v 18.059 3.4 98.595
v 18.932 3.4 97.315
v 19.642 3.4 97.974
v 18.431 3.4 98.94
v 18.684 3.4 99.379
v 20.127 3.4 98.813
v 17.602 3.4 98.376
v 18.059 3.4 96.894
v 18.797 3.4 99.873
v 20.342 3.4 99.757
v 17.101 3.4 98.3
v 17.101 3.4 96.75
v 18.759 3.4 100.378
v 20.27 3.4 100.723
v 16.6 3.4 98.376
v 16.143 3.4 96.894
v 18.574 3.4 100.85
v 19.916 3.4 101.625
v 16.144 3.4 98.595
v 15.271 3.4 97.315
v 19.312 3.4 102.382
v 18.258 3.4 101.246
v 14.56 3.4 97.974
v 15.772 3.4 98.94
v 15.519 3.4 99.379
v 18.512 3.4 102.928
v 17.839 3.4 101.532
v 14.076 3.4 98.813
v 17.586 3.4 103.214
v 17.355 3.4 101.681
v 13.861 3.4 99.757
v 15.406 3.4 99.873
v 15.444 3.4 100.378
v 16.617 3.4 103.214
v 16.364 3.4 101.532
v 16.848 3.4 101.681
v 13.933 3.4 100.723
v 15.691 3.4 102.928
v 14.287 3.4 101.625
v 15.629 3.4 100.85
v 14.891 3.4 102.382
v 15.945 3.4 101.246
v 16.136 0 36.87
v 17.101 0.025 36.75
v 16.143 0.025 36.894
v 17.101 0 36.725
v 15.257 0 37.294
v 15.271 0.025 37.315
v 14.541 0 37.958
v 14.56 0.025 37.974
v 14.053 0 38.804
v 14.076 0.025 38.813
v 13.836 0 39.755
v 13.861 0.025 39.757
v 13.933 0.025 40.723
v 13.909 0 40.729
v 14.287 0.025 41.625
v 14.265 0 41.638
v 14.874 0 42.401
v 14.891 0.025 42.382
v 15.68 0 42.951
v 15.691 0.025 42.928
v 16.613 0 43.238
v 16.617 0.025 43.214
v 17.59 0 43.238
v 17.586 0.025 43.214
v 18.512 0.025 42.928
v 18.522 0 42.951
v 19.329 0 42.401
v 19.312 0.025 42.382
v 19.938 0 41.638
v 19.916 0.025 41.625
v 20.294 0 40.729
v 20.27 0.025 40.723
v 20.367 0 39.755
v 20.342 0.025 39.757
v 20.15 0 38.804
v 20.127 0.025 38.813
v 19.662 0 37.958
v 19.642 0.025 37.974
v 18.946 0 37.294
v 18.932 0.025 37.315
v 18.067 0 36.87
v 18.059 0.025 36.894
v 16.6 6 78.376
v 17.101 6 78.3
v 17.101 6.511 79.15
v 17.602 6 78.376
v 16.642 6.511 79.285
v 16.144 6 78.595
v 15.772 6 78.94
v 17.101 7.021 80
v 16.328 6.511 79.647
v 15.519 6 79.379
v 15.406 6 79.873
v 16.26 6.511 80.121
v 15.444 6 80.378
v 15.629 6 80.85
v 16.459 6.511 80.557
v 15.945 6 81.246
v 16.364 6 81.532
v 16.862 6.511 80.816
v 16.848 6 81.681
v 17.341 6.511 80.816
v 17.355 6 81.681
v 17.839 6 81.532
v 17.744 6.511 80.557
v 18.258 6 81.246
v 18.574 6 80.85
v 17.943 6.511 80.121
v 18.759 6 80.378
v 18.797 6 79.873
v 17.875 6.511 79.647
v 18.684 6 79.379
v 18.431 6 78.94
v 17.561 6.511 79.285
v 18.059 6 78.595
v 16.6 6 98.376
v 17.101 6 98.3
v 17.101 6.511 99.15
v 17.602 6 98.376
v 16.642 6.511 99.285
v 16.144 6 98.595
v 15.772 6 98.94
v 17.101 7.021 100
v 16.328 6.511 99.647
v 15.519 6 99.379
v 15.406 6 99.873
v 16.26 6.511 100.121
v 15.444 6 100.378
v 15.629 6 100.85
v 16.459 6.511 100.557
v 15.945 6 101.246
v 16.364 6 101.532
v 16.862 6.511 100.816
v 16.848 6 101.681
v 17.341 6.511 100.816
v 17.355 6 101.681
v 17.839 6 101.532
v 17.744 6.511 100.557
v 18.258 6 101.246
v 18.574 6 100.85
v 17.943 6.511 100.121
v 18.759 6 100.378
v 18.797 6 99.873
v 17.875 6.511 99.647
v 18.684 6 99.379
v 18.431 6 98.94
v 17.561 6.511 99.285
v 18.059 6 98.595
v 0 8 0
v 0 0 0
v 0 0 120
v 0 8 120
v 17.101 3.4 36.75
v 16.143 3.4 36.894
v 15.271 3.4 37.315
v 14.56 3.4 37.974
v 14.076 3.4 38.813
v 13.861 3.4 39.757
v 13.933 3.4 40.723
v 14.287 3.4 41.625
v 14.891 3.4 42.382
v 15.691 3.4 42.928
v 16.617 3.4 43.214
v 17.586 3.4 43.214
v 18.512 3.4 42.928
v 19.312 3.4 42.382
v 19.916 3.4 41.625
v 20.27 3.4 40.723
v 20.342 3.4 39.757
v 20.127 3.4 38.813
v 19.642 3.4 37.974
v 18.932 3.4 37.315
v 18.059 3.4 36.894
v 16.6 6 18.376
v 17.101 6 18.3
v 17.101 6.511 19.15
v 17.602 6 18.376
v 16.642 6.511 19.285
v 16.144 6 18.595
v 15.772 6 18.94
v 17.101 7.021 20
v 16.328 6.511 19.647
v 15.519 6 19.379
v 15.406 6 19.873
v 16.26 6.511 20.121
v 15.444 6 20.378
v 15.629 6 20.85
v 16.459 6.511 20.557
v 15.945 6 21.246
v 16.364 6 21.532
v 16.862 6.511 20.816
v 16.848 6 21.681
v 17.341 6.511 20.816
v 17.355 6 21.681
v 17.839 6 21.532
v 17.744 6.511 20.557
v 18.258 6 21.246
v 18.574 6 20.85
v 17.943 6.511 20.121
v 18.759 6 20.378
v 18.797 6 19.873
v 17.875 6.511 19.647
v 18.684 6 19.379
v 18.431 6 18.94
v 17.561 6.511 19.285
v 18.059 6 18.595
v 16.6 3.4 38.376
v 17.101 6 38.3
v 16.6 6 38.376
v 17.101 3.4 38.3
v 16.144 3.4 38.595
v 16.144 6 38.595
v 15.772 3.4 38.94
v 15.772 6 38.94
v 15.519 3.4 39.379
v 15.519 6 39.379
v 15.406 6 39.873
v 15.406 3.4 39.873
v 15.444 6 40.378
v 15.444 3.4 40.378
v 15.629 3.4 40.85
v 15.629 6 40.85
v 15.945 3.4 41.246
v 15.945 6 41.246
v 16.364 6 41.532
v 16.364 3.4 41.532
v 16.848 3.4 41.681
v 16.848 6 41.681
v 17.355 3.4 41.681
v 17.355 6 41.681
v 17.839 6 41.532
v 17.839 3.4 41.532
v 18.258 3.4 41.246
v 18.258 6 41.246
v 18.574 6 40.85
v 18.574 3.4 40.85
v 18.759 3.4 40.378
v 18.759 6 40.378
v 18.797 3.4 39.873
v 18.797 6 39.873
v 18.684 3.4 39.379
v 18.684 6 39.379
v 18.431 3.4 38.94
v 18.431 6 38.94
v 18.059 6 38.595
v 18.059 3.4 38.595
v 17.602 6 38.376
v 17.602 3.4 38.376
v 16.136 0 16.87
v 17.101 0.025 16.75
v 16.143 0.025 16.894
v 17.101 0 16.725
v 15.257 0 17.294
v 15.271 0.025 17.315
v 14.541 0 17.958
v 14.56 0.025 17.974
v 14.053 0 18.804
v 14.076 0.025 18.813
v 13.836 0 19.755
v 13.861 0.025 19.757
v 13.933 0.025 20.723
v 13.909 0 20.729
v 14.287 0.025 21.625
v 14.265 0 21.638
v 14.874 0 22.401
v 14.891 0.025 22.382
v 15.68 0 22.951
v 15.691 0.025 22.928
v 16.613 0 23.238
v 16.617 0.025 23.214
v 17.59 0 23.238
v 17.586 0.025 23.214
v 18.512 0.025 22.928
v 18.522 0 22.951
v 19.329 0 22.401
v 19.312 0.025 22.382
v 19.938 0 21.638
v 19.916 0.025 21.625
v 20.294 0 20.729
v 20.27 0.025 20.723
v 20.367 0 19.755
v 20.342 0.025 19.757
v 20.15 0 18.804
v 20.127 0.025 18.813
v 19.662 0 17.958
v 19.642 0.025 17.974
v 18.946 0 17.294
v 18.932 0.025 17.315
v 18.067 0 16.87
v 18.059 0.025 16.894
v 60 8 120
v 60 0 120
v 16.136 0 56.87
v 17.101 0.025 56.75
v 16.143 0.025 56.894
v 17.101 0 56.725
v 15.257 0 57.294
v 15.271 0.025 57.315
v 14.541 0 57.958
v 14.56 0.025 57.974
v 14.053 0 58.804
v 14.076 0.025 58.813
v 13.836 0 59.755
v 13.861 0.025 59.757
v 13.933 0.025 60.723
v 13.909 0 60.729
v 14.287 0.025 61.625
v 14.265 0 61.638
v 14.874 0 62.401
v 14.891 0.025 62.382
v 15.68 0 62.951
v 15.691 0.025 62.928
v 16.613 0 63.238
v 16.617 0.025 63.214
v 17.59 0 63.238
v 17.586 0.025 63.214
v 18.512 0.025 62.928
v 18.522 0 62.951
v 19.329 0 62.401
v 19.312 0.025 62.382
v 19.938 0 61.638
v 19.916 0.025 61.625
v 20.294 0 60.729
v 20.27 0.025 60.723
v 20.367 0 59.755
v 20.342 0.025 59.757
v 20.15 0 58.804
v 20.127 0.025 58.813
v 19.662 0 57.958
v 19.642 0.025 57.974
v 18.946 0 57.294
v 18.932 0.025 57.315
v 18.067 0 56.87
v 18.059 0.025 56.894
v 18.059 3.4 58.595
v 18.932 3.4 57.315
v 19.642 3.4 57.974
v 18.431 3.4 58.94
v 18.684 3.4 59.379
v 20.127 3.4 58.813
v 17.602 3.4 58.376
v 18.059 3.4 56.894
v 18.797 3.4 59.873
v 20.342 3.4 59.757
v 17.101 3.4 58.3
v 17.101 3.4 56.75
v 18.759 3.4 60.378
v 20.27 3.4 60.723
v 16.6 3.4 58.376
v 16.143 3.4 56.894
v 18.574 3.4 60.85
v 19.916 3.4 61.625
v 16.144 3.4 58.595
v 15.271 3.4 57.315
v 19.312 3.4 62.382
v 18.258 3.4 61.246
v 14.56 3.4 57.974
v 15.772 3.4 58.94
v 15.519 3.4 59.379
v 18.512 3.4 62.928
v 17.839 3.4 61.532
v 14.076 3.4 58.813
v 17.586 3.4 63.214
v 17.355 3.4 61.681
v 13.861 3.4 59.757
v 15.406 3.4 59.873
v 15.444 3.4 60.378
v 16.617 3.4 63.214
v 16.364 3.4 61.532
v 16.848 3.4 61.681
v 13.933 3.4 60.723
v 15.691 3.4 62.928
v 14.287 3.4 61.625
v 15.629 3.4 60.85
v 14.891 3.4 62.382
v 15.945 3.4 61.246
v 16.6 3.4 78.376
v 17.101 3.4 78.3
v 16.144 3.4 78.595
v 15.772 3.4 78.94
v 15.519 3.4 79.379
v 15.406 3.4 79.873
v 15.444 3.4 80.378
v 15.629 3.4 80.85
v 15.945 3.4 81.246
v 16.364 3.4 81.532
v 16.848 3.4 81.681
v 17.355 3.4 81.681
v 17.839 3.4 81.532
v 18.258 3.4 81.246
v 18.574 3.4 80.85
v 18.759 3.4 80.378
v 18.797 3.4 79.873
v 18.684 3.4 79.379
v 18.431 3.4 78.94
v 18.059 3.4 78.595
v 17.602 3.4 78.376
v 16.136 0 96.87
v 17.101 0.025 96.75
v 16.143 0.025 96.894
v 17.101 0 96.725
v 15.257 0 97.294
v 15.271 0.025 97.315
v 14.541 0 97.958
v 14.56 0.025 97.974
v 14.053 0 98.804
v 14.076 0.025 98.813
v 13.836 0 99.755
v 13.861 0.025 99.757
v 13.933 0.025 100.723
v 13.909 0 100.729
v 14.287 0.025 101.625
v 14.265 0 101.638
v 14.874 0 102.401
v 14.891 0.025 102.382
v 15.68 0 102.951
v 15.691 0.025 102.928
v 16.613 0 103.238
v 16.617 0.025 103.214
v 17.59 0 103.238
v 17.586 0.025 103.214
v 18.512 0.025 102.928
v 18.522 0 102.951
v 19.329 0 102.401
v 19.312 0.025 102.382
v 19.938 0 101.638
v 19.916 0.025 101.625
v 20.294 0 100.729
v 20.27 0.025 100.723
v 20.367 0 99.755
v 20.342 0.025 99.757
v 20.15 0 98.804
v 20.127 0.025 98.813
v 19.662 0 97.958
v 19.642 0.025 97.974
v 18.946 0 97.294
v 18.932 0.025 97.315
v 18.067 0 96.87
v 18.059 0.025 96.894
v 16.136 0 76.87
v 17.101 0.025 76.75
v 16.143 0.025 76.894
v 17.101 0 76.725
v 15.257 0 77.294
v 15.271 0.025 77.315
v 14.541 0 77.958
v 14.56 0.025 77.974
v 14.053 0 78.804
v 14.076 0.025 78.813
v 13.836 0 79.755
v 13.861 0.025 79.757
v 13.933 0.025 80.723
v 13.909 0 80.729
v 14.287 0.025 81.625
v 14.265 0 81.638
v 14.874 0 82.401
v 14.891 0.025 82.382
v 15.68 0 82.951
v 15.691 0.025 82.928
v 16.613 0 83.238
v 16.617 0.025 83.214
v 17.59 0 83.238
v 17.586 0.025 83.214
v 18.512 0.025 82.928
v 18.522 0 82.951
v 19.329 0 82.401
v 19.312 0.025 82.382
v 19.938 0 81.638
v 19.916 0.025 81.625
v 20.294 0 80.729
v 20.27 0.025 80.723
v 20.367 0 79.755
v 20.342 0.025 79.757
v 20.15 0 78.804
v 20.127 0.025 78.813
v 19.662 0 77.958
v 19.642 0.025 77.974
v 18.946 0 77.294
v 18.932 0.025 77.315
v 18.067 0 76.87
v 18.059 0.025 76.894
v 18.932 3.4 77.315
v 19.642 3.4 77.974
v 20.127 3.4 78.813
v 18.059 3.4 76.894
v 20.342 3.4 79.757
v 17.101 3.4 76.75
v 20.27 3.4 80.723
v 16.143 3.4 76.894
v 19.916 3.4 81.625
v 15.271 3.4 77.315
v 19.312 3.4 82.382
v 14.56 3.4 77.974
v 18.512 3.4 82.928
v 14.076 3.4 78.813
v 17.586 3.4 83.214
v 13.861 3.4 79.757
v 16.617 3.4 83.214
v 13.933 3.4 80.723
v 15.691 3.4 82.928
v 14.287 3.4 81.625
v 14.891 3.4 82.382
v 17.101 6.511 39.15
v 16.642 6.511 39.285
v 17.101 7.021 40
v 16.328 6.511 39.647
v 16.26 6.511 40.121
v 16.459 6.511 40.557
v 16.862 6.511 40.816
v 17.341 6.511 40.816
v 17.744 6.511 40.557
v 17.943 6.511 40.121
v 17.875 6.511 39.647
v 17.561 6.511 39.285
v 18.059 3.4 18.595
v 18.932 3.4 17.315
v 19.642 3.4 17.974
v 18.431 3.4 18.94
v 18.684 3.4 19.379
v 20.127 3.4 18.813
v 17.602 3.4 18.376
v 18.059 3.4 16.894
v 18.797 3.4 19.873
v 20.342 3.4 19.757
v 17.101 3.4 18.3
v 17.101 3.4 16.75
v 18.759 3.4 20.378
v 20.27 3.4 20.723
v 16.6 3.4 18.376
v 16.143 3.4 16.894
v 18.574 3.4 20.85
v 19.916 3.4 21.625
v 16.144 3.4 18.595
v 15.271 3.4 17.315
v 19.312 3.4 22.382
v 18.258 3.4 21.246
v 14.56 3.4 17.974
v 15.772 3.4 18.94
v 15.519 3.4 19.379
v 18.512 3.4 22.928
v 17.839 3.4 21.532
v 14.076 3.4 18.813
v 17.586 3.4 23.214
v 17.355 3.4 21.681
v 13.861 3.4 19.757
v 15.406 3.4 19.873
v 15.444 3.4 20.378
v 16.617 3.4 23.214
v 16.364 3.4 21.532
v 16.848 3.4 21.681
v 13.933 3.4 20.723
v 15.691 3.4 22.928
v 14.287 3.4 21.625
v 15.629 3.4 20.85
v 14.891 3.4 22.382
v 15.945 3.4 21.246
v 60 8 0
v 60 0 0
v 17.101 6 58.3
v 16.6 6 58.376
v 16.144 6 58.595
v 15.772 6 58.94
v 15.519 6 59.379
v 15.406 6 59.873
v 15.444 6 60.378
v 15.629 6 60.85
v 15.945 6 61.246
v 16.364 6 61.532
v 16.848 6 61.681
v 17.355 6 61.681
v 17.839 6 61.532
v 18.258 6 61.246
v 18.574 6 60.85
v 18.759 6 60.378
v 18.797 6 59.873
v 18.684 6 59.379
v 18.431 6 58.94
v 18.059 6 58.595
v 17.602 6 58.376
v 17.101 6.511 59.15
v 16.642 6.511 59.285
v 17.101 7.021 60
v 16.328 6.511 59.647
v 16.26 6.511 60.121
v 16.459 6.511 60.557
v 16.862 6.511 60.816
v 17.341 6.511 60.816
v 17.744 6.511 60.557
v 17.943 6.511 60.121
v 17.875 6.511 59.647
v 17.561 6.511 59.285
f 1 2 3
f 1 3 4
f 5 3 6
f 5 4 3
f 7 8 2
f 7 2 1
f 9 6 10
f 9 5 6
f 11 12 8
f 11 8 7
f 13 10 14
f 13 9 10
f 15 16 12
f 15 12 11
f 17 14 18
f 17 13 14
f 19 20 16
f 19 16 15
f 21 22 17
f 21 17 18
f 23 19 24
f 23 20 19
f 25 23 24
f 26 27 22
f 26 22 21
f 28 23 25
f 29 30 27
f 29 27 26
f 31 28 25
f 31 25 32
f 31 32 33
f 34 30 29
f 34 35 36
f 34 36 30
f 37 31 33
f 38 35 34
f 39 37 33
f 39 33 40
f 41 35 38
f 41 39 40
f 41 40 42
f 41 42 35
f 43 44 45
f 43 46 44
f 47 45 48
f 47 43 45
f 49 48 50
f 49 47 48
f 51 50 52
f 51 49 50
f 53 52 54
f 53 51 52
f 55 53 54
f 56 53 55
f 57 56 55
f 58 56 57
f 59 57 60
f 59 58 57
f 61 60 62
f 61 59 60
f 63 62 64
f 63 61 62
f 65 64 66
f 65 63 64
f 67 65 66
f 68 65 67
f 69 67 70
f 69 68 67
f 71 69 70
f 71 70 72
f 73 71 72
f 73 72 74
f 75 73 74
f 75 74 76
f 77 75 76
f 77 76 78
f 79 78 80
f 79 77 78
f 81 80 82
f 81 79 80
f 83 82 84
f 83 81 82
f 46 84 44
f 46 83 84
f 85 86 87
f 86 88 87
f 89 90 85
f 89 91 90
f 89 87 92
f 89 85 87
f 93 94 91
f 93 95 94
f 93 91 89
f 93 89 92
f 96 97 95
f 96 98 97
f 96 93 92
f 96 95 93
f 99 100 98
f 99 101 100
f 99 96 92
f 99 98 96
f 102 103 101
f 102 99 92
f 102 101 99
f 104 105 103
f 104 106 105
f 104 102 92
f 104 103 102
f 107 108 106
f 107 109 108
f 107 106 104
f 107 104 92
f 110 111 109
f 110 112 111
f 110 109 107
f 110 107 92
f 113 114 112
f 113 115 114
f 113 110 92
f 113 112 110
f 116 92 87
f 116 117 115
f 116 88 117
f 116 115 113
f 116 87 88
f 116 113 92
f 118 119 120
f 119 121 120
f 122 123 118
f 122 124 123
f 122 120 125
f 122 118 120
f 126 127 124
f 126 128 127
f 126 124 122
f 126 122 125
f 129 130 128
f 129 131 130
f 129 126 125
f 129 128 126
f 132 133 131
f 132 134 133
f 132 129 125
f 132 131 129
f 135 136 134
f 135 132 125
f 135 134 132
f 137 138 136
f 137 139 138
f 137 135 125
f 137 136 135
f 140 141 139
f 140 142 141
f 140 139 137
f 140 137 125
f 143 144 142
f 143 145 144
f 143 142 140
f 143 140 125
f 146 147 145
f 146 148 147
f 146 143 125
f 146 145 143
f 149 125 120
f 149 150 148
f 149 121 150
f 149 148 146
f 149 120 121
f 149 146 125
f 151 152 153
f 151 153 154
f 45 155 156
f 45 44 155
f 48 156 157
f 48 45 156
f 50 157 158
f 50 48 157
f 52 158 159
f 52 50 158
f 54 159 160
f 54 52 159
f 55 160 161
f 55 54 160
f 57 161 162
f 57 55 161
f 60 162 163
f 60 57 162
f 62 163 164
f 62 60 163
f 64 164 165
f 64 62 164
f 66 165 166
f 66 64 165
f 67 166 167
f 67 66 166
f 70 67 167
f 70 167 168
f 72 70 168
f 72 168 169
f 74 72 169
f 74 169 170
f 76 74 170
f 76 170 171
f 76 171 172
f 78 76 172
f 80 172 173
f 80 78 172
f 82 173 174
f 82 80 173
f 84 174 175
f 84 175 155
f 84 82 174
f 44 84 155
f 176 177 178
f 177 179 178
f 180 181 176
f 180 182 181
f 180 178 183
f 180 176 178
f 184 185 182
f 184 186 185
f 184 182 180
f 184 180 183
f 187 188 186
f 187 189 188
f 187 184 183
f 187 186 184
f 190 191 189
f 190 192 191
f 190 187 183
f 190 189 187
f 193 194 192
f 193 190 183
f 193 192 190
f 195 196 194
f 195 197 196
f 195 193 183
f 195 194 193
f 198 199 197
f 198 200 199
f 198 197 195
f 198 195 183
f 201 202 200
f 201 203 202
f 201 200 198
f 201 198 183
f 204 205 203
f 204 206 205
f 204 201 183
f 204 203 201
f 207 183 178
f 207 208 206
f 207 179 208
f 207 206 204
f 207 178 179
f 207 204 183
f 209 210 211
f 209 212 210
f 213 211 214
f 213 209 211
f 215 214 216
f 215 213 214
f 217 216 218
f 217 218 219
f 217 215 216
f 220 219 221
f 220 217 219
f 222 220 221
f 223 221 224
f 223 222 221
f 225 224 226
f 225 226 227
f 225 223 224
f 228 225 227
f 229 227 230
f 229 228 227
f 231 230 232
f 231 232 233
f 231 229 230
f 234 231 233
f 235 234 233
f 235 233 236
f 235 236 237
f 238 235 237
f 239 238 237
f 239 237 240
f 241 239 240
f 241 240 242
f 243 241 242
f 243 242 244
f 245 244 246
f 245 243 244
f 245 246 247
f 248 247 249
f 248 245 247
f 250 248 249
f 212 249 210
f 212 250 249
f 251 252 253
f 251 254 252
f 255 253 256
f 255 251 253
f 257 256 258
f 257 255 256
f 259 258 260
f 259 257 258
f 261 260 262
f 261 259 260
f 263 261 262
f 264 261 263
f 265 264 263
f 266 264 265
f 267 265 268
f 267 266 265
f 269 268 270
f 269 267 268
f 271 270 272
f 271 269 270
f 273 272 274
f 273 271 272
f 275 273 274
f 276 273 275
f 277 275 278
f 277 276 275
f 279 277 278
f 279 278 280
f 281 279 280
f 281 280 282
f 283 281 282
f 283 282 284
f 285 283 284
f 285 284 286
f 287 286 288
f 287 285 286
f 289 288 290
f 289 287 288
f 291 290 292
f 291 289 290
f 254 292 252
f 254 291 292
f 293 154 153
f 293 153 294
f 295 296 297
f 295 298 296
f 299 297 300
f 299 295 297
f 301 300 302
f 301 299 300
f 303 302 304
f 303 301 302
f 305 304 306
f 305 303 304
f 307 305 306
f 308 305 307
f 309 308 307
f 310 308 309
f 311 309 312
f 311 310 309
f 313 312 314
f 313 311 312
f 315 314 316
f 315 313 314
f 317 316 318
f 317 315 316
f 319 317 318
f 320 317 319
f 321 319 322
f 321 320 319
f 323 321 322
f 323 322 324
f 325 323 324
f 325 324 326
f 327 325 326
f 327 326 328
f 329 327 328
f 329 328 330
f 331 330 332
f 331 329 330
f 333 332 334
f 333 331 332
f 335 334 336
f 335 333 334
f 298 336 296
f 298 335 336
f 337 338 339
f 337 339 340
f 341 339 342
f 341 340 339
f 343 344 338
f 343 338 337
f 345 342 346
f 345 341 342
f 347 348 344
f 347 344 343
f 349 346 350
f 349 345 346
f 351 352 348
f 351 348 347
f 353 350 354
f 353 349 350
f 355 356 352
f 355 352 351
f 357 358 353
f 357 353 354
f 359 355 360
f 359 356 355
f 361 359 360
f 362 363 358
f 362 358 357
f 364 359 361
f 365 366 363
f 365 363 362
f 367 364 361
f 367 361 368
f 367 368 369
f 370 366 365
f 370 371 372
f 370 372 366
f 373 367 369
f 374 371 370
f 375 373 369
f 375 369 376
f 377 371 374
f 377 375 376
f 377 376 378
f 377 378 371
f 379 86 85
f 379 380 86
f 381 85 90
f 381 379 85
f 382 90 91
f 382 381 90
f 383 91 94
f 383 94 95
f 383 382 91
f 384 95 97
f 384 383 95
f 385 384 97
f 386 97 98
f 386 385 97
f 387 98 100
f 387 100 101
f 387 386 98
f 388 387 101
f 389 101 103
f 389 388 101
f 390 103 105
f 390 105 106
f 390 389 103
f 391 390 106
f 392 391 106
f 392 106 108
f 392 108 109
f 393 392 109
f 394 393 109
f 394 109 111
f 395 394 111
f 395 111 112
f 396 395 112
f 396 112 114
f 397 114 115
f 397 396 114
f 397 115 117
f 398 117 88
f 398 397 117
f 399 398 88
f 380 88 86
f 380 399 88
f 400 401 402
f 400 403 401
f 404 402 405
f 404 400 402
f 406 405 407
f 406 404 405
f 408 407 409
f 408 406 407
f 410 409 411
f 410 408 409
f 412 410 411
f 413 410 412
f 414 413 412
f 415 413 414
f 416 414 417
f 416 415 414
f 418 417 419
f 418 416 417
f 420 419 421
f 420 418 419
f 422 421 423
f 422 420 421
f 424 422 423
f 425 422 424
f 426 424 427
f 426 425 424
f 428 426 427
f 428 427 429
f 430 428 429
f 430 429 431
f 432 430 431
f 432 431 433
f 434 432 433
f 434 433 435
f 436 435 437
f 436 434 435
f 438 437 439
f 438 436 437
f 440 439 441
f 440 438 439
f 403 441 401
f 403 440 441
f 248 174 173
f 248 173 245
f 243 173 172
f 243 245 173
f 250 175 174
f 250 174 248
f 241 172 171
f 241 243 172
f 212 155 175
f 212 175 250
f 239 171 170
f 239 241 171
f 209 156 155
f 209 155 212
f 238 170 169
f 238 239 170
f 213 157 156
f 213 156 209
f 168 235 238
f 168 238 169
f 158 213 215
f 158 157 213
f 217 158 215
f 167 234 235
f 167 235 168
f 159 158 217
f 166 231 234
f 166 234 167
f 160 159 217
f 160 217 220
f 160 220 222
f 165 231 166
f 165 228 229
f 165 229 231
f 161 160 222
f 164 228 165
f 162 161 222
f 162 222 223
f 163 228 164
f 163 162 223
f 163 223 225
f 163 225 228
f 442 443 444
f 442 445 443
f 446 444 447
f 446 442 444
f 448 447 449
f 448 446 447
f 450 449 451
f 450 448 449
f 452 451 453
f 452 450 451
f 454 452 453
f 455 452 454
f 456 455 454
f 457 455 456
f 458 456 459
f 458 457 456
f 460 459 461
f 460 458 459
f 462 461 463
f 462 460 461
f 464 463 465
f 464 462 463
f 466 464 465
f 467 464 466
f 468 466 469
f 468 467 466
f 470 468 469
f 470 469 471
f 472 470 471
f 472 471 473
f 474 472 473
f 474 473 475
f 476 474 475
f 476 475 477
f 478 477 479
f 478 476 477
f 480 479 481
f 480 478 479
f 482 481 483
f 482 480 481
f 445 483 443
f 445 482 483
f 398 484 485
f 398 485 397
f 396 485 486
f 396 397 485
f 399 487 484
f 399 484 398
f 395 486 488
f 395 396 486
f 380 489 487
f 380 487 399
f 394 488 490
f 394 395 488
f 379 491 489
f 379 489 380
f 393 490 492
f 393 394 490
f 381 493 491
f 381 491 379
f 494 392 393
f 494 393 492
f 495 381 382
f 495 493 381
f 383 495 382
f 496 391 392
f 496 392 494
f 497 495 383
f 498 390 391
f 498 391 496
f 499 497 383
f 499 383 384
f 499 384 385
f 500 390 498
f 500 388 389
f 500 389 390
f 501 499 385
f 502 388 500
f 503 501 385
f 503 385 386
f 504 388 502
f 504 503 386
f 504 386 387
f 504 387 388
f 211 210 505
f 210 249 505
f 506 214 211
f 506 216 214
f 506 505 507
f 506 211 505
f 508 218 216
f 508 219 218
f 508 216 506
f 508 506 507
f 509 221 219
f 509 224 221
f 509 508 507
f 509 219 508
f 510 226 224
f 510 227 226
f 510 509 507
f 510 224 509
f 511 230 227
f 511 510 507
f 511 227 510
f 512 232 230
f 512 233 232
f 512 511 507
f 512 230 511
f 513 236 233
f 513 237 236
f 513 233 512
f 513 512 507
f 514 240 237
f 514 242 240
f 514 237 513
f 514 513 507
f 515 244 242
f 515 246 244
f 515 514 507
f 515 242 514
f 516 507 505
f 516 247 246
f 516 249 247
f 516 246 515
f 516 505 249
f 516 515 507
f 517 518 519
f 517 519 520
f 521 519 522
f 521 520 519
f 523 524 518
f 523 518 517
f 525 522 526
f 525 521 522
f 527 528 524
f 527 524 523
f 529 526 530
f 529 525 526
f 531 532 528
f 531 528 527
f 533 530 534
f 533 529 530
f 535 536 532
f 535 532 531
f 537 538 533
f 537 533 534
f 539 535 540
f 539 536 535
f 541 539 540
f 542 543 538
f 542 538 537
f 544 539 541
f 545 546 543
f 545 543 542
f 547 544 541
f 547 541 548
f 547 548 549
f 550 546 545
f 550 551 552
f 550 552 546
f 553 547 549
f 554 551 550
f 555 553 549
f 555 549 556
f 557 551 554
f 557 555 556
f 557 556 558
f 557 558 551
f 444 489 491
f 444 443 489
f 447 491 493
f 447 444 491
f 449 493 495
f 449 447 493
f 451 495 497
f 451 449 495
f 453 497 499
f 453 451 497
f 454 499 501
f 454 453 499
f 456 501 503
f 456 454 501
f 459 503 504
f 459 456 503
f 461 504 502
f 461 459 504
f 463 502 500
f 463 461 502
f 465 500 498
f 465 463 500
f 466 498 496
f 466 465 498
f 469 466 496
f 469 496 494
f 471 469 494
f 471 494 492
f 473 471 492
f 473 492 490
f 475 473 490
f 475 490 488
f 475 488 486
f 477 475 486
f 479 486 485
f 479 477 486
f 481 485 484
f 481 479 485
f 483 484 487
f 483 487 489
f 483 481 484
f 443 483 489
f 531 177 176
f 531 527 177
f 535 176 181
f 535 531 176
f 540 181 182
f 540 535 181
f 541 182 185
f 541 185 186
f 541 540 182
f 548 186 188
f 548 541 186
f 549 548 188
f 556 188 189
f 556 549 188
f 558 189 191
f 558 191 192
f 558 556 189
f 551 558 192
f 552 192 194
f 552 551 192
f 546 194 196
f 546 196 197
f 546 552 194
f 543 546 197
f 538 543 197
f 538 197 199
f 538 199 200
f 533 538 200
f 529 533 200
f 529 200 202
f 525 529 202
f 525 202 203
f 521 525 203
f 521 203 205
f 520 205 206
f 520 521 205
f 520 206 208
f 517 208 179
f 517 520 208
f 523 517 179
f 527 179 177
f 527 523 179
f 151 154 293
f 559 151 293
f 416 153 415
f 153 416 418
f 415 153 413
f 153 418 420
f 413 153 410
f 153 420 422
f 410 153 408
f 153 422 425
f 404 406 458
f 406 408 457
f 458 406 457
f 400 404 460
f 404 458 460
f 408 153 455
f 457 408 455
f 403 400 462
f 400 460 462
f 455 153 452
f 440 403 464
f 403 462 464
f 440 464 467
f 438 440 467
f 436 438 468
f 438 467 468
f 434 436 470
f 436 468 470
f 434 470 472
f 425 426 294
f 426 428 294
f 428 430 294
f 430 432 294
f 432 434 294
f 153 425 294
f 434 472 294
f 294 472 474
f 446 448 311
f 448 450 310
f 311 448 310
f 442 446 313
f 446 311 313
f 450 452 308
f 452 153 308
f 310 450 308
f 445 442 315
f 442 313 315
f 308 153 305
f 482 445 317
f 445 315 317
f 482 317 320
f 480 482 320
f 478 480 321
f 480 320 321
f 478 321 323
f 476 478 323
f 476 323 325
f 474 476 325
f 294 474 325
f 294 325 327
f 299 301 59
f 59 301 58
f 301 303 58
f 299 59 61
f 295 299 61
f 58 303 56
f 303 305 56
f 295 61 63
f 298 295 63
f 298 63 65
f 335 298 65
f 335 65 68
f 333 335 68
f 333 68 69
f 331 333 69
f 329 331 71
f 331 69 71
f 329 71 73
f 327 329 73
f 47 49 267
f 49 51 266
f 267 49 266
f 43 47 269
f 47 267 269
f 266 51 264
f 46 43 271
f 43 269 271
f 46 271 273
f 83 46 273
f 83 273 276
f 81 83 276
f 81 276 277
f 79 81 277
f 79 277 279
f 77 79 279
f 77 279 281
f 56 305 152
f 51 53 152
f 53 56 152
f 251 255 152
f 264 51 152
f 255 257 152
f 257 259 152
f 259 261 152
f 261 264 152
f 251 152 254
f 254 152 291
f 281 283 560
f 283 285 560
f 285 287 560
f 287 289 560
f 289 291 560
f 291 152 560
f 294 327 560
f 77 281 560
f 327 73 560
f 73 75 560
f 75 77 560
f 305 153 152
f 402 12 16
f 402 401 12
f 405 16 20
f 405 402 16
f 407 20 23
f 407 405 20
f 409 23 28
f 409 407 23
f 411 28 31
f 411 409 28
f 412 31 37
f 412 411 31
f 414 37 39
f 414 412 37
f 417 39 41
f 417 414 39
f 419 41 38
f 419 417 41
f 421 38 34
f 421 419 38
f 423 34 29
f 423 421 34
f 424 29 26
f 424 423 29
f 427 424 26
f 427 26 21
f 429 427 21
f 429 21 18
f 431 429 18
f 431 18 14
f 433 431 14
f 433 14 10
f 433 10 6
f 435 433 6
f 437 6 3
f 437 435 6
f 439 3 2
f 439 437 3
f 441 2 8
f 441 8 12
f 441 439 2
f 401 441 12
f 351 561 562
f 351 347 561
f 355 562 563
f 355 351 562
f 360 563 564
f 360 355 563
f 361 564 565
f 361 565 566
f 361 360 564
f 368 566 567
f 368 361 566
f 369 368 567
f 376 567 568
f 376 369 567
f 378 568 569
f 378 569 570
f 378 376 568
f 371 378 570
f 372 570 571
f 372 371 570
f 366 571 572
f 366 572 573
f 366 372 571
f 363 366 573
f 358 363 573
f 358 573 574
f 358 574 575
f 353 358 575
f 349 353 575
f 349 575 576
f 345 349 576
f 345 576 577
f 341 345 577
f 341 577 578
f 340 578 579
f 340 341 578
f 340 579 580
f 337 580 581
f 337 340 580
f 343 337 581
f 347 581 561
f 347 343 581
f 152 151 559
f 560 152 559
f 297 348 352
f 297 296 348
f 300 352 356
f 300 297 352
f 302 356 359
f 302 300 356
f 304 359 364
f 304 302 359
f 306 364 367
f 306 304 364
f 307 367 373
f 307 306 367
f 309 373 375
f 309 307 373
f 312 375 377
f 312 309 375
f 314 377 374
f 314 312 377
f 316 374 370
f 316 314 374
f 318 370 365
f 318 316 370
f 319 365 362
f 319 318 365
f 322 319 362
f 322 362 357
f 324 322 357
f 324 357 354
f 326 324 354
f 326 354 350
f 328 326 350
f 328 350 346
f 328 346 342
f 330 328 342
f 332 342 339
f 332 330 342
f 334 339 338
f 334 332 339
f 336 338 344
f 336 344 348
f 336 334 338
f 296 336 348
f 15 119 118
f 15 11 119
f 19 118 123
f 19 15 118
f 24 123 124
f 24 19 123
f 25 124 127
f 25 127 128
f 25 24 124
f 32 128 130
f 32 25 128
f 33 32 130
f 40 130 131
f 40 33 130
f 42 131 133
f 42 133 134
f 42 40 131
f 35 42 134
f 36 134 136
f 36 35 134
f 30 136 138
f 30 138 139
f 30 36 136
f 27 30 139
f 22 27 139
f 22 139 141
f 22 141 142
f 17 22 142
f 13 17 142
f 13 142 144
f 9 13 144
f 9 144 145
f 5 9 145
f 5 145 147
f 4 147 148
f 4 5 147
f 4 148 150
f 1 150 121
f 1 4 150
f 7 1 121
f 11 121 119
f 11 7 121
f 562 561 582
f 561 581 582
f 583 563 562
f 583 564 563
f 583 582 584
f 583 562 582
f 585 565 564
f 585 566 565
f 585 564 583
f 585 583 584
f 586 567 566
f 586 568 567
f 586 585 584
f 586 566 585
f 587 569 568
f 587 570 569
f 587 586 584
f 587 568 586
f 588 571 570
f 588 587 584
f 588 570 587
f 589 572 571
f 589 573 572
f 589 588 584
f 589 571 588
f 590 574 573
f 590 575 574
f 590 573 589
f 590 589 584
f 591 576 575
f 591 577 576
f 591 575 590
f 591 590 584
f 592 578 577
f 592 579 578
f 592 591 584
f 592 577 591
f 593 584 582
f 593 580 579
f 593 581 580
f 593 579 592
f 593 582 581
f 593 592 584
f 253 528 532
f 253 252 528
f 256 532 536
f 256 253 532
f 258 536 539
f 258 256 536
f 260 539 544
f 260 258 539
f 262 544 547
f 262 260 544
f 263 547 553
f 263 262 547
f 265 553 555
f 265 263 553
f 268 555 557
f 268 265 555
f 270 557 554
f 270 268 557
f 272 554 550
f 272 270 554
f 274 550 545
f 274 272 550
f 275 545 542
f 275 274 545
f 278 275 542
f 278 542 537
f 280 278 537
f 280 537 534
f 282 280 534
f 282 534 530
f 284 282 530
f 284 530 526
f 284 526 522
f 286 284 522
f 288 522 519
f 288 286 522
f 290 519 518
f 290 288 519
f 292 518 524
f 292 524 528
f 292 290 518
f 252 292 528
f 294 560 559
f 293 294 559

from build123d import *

# Parameters (mm, degrees)
SKETCH1_W                                    = 60
SKETCH1_H                                    = 8
BOSS_EXTRUDE1_DEPTH                          = 120
CBORE_FOR_M3_HEX_SOCKET_HEAD_CAP_SCR_2_COUNT = 2
CBORE_FOR_M3_HEX_SOCKET_HEAD_CAP_SCR_2_PITCH = 40
CBORE_FOR_M3_HEX_SOCKET_HEAD_CAP_SCR_3_COUNT = 2
CBORE_FOR_M3_HEX_SOCKET_HEAD_CAP_SCR_3_PITCH = 60
CBORE_FOR_M3_HEX_SOCKET_HEAD_CAP_SCR_4_COUNT = 2
CBORE_FOR_M3_HEX_SOCKET_HEAD_CAP_SCR_4_PITCH = 80
CBORE_FOR_M3_HEX_SOCKET_HEAD_CAP_SCR_5_COUNT = 2
CBORE_FOR_M3_HEX_SOCKET_HEAD_CAP_SCR_5_PITCH = 20


with BuildPart() as part:
    # Sketch1 → Boss-Extrude1 (new body)
    with BuildSketch(Plane.XY):
        with Locations((30, 4)):
            Rectangle(SKETCH1_W, SKETCH1_H)
    extrude(amount=BOSS_EXTRUDE1_DEPTH)

    # Sketch4 → CBORE for M3 Hex Socket Head Cap Screw1 (revolve, cut)
    with BuildSketch(Plane(origin=(17.101413203, 0, 100), x_dir=(0, 0, -1), z_dir=(1, 0, 0))):
        Polygon((0, 0), (0, 7.021463052), (1.7, 6), (1.7, 3.4), (3.25, 3.4), (3.25, 0.025), (3.275, 0), align=None)
    cbore_for_m3_hex_socket_head_cap_screw1 = revolve(axis=Axis((17.101413203, -6.35, 100), (0, 1, 0)), mode=Mode.SUBTRACT)

    # CBORE for M3 Hex Socket Head Cap Scr 2: CBORE for M3 Hex Socket Head Cap Screw1 ×2
    with Locations(*[(0, 0, -i * CBORE_FOR_M3_HEX_SOCKET_HEAD_CAP_SCR_2_PITCH) for i in range(1, CBORE_FOR_M3_HEX_SOCKET_HEAD_CAP_SCR_2_COUNT)]):
        add(cbore_for_m3_hex_socket_head_cap_screw1, mode=Mode.SUBTRACT)

    # CBORE for M3 Hex Socket Head Cap Scr 3: CBORE for M3 Hex Socket Head Cap Screw1 ×2
    with Locations(*[(0, 0, -i * CBORE_FOR_M3_HEX_SOCKET_HEAD_CAP_SCR_3_PITCH) for i in range(1, CBORE_FOR_M3_HEX_SOCKET_HEAD_CAP_SCR_3_COUNT)]):
        add(cbore_for_m3_hex_socket_head_cap_screw1, mode=Mode.SUBTRACT)

    # CBORE for M3 Hex Socket Head Cap Scr 4: CBORE for M3 Hex Socket Head Cap Screw1 ×2
    with Locations(*[(0, 0, -i * CBORE_FOR_M3_HEX_SOCKET_HEAD_CAP_SCR_4_PITCH) for i in range(1, CBORE_FOR_M3_HEX_SOCKET_HEAD_CAP_SCR_4_COUNT)]):
        add(cbore_for_m3_hex_socket_head_cap_screw1, mode=Mode.SUBTRACT)

    # CBORE for M3 Hex Socket Head Cap Scr 5: CBORE for M3 Hex Socket Head Cap Screw1 ×2
    with Locations(*[(0, 0, -i * CBORE_FOR_M3_HEX_SOCKET_HEAD_CAP_SCR_5_PITCH) for i in range(1, CBORE_FOR_M3_HEX_SOCKET_HEAD_CAP_SCR_5_COUNT)]):
        add(cbore_for_m3_hex_socket_head_cap_screw1, mode=Mode.SUBTRACT)


solid = part.part
